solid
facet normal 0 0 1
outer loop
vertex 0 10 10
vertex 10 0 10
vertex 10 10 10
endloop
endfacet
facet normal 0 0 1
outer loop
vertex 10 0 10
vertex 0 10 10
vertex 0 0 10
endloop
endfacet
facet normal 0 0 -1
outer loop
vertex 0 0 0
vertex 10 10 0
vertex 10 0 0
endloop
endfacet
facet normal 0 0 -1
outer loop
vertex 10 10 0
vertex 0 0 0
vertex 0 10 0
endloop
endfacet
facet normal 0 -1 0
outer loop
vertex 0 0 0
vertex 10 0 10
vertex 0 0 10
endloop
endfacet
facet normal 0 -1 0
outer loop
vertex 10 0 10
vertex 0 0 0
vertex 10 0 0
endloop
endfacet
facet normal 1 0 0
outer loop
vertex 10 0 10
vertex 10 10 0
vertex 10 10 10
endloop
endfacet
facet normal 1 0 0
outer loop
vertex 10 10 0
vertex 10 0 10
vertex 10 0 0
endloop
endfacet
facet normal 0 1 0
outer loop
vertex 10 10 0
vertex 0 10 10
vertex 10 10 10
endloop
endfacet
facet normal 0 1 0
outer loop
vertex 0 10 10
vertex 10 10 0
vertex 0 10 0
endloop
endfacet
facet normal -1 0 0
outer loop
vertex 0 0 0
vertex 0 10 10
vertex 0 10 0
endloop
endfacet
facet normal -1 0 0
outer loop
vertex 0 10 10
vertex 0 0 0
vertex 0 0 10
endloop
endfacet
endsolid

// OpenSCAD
//----------------------------------------------------------
//-- Tutorial OpenScad
//-- Juan Gonzalez-Gomez (Obijuan) juan@iearobotics.com
//----------------------------------------------------------
//-- (c) Mayo, 2012
//-- Licencia GPL
//----------------------------------------------------------
//-- Construccion del cubo "hola mundo"
//----------------------------------------------------------

//-- Cubo Hola Mundo
cube([10,10,10]);
